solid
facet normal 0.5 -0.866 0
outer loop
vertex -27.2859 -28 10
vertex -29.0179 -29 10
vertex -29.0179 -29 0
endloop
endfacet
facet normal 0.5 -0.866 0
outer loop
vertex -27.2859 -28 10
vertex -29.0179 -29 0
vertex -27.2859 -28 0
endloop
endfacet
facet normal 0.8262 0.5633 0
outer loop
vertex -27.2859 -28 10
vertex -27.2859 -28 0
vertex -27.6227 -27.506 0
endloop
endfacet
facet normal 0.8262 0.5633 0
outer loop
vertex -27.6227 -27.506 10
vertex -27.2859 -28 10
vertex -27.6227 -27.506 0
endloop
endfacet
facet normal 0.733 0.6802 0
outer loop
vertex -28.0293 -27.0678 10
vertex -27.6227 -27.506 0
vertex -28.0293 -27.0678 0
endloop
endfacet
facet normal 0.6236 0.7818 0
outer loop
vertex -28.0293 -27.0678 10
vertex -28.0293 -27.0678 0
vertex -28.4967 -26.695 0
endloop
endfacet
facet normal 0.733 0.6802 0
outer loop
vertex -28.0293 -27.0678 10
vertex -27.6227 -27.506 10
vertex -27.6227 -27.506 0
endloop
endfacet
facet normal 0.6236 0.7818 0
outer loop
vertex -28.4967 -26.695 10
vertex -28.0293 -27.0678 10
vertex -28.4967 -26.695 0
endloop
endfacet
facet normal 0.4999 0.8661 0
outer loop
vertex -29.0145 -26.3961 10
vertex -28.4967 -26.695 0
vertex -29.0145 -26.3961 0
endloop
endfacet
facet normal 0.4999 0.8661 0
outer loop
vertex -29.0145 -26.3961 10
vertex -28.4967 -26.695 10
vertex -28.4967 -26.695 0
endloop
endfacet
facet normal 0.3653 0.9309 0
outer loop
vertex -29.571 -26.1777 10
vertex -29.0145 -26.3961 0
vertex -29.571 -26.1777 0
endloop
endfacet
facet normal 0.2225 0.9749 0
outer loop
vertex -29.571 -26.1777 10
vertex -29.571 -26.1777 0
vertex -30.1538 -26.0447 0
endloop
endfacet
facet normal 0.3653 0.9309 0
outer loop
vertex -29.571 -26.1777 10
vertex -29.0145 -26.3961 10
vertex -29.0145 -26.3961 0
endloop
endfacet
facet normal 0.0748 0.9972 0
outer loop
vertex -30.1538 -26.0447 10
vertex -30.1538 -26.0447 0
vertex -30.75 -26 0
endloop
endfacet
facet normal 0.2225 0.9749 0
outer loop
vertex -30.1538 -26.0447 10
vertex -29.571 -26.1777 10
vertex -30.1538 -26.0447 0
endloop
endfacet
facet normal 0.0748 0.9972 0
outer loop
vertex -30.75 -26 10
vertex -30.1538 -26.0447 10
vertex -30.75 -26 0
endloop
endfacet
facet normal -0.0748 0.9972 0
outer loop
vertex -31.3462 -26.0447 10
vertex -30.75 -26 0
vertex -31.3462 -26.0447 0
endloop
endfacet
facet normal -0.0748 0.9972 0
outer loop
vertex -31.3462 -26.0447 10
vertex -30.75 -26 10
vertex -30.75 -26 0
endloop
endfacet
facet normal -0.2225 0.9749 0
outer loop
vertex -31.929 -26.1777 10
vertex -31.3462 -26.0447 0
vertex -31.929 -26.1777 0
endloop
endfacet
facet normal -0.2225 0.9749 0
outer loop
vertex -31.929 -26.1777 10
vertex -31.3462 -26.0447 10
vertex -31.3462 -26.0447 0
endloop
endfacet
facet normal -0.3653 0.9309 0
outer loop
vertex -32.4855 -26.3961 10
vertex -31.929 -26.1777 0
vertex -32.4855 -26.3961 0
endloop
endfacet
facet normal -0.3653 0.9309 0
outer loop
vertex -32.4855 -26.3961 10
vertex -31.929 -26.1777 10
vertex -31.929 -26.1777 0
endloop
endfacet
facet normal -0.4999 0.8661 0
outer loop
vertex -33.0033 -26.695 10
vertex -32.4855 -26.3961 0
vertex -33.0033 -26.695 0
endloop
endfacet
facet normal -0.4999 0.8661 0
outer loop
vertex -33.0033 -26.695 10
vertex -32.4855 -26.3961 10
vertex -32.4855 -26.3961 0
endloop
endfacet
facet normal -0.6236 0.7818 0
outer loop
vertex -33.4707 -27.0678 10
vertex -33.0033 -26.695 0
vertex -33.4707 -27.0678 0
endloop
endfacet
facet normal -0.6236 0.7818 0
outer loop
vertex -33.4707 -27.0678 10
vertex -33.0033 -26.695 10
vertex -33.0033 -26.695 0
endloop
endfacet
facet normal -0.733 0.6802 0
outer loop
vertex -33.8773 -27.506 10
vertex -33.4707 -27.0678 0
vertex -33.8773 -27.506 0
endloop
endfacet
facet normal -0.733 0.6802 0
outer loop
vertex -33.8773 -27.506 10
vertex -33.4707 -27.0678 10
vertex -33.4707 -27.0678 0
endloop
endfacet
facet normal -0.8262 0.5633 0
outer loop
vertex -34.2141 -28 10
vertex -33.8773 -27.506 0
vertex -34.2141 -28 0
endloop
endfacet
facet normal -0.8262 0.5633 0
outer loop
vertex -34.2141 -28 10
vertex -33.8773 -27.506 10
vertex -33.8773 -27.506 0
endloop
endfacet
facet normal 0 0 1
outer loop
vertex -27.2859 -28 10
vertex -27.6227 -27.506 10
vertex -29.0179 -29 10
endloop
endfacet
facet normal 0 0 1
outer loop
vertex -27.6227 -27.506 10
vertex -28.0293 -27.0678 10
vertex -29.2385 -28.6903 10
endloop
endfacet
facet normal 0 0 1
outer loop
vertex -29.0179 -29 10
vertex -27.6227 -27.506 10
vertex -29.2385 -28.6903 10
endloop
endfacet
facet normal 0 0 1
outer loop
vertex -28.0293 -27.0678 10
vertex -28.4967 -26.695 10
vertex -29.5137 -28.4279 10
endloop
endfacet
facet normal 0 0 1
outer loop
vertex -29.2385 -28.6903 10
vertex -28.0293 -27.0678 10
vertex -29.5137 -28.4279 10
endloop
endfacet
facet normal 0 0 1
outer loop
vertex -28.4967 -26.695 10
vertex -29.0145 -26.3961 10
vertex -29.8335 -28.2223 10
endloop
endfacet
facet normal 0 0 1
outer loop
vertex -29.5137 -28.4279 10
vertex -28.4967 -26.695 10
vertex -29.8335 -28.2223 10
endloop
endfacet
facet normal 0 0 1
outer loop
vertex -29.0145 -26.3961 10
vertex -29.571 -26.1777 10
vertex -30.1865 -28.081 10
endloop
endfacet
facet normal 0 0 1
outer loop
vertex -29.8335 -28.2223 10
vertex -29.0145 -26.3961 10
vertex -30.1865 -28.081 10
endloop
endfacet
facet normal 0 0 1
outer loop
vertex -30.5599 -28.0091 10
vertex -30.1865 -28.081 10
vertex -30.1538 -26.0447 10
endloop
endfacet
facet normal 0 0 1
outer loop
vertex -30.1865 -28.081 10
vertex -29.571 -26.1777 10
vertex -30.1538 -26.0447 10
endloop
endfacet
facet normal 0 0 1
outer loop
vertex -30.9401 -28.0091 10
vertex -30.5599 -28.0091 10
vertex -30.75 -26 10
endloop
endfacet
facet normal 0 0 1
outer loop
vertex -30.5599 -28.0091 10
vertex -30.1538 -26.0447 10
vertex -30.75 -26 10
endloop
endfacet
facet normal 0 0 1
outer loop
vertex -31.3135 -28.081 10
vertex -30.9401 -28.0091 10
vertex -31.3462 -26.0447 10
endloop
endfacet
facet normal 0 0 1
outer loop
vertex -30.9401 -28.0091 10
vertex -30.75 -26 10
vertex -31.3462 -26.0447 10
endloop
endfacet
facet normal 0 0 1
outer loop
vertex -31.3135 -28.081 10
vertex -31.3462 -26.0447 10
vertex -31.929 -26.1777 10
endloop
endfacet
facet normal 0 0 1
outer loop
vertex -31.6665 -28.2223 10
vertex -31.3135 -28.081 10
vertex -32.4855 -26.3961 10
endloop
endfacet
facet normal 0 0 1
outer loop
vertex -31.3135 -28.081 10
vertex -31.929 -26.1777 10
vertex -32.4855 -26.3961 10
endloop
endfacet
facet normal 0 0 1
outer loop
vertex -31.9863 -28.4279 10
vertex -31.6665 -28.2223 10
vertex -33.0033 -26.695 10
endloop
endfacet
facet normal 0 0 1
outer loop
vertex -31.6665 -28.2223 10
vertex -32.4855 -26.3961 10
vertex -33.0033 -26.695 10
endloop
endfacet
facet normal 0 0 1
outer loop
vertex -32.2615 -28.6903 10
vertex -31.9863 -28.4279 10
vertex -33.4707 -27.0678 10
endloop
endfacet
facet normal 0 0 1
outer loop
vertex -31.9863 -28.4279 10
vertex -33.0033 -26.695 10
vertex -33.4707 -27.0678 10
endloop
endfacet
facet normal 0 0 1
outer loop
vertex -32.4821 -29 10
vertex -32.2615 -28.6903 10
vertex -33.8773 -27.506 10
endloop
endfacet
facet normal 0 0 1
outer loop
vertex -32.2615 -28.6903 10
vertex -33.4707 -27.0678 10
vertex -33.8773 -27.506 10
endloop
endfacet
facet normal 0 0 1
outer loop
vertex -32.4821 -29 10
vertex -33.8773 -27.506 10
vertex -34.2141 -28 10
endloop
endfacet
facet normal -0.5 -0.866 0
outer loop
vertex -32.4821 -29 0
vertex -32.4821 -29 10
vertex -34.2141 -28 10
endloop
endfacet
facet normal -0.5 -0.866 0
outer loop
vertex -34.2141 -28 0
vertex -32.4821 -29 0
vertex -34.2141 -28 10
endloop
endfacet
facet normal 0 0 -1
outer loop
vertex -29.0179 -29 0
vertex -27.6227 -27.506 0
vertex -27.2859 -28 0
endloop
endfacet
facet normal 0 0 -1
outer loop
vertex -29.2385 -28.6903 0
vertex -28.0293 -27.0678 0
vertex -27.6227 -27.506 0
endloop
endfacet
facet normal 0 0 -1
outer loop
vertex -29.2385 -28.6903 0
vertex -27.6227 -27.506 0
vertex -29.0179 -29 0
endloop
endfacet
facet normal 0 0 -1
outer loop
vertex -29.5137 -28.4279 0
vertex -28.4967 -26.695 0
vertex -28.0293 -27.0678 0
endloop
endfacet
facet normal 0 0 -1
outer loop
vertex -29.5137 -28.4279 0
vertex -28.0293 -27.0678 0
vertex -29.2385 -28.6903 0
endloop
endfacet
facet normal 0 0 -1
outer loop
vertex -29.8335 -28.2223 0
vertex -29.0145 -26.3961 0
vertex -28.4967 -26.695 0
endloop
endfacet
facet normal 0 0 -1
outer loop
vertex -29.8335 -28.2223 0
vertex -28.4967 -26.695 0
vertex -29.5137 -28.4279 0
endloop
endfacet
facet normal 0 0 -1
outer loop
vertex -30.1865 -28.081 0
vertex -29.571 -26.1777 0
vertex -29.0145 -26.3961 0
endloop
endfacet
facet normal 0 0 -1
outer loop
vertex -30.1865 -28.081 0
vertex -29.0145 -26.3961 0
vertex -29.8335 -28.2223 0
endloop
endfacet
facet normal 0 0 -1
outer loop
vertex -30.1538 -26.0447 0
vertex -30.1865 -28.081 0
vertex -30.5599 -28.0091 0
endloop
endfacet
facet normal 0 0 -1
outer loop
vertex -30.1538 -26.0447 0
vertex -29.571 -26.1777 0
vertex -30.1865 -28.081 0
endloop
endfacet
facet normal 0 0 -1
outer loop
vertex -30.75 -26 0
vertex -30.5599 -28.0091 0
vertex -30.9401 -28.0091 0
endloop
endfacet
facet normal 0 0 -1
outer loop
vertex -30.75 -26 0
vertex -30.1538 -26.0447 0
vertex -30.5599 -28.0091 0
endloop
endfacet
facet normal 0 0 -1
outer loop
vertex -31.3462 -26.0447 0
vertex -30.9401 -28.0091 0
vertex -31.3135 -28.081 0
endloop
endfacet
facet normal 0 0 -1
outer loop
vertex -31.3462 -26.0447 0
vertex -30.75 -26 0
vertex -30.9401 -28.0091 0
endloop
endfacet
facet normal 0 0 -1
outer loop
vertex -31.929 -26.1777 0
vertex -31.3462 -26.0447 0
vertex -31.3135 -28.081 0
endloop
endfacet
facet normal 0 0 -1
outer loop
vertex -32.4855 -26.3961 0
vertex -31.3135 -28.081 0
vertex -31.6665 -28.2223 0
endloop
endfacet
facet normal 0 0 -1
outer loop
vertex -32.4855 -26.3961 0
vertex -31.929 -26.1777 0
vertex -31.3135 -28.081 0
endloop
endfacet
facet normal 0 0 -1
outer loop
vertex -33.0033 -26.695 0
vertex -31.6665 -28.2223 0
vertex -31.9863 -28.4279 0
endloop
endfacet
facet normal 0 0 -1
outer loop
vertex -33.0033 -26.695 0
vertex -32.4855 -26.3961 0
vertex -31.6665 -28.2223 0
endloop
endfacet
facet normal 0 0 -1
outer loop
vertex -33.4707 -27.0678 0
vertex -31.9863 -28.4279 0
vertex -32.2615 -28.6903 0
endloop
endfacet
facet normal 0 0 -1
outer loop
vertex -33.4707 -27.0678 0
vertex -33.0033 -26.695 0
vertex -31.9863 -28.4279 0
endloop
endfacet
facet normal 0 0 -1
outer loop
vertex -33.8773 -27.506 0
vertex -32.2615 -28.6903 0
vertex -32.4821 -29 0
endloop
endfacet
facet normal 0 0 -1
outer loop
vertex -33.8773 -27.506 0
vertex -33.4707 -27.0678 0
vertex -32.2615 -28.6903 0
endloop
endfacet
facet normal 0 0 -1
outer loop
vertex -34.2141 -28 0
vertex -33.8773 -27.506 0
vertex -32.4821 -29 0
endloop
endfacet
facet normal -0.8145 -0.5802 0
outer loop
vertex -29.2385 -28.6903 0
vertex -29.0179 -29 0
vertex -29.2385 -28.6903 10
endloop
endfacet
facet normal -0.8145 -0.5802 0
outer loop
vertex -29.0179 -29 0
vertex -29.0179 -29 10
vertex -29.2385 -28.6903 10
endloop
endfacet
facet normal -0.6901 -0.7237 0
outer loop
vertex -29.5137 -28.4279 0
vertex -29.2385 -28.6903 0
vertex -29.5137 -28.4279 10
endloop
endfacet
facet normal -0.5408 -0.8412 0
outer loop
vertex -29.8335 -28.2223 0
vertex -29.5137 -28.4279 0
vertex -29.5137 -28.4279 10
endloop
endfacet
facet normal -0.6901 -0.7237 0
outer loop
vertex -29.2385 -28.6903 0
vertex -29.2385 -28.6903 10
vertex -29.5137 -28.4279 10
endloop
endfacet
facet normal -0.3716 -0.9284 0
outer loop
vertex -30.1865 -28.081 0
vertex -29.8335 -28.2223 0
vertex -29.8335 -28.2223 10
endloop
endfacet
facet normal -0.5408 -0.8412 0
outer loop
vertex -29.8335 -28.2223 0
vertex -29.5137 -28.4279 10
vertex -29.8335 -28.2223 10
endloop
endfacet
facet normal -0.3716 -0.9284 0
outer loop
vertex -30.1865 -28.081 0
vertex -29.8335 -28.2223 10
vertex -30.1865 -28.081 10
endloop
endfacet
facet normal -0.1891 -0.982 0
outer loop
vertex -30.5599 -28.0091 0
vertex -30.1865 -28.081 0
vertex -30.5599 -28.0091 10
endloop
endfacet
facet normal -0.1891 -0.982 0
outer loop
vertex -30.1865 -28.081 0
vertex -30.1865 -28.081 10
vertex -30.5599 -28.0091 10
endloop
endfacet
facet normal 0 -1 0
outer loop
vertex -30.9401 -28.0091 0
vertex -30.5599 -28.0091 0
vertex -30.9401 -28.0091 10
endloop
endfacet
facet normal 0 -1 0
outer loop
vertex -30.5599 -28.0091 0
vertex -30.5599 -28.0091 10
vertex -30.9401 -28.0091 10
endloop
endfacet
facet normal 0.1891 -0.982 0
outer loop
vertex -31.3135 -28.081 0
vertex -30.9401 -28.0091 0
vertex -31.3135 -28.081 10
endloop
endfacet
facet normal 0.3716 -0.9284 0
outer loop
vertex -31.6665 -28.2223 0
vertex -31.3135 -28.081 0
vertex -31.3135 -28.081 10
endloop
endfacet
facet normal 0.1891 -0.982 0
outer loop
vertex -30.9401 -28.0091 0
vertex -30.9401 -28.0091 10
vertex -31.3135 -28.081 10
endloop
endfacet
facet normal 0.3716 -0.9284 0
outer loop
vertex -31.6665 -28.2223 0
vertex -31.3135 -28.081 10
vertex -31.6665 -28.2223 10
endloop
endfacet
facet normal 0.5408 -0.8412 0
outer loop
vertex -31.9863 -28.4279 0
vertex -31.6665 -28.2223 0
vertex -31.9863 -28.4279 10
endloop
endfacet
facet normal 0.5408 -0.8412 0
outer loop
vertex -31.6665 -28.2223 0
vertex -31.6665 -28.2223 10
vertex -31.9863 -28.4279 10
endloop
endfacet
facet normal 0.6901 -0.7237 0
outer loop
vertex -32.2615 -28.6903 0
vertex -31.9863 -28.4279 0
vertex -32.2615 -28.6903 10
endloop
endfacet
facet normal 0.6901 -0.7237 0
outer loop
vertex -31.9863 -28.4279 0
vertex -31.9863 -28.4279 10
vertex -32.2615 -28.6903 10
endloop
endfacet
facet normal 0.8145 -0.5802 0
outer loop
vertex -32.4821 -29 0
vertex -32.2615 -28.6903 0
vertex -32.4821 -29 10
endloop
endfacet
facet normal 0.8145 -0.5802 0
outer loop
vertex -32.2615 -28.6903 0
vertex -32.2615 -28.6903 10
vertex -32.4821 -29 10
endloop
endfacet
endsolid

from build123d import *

# Parameters (mm, degrees)
CYLINDER018_W               = 2
CYLINDER018_H               = 10
CYLINDER018_ANGLE           = 120
CYLINDER018_PLACEMENT_ANGLE = 30
CYLINDER016_W               = 4
CYLINDER016_H               = 10
CYLINDER016_ANGLE           = 120
CYLINDER016_PLACEMENT_ANGLE = 30


with BuildPart() as cilindro009:
    # Cylinder018 → Cylinder018 (revolve)
    with BuildSketch(Plane.XZ):
        with Locations((1, 5)):
            Rectangle(CYLINDER018_W, CYLINDER018_H)
    revolve(axis=Axis((0, 0, 0), (0, 0, 1)), revolution_arc=CYLINDER018_ANGLE)


with BuildPart() as cilindro009_1:
    # Cylinder018 placement: moved
    add(cilindro009.part.moved(Location((-30.75, -30, 0))).rotate(Axis((-30.75, -30, 0), (0, 0, 1)), CYLINDER018_PLACEMENT_ANGLE))


with BuildPart() as inalambrico_peque_o001:
    # Cylinder016 → Cylinder016 (revolve)
    with BuildSketch(Plane.XZ):
        with Locations((2, 5)):
            Rectangle(CYLINDER016_W, CYLINDER016_H)
    revolve(axis=Axis((0, 0, 0), (0, 0, 1)), revolution_arc=CYLINDER016_ANGLE)


with BuildPart() as inalambrico_peque_o001_1:
    # Cylinder016 placement: moved
    add(inalambrico_peque_o001.part.moved(Location((-30.75, -30, 0))).rotate(Axis((-30.75, -30, 0), (0, 0, 1)), CYLINDER016_PLACEMENT_ANGLE))

    # Cut007: cut Cilindro009
    add(cilindro009_1.part, mode=Mode.SUBTRACT)


solid = inalambrico_peque_o001_1.part
